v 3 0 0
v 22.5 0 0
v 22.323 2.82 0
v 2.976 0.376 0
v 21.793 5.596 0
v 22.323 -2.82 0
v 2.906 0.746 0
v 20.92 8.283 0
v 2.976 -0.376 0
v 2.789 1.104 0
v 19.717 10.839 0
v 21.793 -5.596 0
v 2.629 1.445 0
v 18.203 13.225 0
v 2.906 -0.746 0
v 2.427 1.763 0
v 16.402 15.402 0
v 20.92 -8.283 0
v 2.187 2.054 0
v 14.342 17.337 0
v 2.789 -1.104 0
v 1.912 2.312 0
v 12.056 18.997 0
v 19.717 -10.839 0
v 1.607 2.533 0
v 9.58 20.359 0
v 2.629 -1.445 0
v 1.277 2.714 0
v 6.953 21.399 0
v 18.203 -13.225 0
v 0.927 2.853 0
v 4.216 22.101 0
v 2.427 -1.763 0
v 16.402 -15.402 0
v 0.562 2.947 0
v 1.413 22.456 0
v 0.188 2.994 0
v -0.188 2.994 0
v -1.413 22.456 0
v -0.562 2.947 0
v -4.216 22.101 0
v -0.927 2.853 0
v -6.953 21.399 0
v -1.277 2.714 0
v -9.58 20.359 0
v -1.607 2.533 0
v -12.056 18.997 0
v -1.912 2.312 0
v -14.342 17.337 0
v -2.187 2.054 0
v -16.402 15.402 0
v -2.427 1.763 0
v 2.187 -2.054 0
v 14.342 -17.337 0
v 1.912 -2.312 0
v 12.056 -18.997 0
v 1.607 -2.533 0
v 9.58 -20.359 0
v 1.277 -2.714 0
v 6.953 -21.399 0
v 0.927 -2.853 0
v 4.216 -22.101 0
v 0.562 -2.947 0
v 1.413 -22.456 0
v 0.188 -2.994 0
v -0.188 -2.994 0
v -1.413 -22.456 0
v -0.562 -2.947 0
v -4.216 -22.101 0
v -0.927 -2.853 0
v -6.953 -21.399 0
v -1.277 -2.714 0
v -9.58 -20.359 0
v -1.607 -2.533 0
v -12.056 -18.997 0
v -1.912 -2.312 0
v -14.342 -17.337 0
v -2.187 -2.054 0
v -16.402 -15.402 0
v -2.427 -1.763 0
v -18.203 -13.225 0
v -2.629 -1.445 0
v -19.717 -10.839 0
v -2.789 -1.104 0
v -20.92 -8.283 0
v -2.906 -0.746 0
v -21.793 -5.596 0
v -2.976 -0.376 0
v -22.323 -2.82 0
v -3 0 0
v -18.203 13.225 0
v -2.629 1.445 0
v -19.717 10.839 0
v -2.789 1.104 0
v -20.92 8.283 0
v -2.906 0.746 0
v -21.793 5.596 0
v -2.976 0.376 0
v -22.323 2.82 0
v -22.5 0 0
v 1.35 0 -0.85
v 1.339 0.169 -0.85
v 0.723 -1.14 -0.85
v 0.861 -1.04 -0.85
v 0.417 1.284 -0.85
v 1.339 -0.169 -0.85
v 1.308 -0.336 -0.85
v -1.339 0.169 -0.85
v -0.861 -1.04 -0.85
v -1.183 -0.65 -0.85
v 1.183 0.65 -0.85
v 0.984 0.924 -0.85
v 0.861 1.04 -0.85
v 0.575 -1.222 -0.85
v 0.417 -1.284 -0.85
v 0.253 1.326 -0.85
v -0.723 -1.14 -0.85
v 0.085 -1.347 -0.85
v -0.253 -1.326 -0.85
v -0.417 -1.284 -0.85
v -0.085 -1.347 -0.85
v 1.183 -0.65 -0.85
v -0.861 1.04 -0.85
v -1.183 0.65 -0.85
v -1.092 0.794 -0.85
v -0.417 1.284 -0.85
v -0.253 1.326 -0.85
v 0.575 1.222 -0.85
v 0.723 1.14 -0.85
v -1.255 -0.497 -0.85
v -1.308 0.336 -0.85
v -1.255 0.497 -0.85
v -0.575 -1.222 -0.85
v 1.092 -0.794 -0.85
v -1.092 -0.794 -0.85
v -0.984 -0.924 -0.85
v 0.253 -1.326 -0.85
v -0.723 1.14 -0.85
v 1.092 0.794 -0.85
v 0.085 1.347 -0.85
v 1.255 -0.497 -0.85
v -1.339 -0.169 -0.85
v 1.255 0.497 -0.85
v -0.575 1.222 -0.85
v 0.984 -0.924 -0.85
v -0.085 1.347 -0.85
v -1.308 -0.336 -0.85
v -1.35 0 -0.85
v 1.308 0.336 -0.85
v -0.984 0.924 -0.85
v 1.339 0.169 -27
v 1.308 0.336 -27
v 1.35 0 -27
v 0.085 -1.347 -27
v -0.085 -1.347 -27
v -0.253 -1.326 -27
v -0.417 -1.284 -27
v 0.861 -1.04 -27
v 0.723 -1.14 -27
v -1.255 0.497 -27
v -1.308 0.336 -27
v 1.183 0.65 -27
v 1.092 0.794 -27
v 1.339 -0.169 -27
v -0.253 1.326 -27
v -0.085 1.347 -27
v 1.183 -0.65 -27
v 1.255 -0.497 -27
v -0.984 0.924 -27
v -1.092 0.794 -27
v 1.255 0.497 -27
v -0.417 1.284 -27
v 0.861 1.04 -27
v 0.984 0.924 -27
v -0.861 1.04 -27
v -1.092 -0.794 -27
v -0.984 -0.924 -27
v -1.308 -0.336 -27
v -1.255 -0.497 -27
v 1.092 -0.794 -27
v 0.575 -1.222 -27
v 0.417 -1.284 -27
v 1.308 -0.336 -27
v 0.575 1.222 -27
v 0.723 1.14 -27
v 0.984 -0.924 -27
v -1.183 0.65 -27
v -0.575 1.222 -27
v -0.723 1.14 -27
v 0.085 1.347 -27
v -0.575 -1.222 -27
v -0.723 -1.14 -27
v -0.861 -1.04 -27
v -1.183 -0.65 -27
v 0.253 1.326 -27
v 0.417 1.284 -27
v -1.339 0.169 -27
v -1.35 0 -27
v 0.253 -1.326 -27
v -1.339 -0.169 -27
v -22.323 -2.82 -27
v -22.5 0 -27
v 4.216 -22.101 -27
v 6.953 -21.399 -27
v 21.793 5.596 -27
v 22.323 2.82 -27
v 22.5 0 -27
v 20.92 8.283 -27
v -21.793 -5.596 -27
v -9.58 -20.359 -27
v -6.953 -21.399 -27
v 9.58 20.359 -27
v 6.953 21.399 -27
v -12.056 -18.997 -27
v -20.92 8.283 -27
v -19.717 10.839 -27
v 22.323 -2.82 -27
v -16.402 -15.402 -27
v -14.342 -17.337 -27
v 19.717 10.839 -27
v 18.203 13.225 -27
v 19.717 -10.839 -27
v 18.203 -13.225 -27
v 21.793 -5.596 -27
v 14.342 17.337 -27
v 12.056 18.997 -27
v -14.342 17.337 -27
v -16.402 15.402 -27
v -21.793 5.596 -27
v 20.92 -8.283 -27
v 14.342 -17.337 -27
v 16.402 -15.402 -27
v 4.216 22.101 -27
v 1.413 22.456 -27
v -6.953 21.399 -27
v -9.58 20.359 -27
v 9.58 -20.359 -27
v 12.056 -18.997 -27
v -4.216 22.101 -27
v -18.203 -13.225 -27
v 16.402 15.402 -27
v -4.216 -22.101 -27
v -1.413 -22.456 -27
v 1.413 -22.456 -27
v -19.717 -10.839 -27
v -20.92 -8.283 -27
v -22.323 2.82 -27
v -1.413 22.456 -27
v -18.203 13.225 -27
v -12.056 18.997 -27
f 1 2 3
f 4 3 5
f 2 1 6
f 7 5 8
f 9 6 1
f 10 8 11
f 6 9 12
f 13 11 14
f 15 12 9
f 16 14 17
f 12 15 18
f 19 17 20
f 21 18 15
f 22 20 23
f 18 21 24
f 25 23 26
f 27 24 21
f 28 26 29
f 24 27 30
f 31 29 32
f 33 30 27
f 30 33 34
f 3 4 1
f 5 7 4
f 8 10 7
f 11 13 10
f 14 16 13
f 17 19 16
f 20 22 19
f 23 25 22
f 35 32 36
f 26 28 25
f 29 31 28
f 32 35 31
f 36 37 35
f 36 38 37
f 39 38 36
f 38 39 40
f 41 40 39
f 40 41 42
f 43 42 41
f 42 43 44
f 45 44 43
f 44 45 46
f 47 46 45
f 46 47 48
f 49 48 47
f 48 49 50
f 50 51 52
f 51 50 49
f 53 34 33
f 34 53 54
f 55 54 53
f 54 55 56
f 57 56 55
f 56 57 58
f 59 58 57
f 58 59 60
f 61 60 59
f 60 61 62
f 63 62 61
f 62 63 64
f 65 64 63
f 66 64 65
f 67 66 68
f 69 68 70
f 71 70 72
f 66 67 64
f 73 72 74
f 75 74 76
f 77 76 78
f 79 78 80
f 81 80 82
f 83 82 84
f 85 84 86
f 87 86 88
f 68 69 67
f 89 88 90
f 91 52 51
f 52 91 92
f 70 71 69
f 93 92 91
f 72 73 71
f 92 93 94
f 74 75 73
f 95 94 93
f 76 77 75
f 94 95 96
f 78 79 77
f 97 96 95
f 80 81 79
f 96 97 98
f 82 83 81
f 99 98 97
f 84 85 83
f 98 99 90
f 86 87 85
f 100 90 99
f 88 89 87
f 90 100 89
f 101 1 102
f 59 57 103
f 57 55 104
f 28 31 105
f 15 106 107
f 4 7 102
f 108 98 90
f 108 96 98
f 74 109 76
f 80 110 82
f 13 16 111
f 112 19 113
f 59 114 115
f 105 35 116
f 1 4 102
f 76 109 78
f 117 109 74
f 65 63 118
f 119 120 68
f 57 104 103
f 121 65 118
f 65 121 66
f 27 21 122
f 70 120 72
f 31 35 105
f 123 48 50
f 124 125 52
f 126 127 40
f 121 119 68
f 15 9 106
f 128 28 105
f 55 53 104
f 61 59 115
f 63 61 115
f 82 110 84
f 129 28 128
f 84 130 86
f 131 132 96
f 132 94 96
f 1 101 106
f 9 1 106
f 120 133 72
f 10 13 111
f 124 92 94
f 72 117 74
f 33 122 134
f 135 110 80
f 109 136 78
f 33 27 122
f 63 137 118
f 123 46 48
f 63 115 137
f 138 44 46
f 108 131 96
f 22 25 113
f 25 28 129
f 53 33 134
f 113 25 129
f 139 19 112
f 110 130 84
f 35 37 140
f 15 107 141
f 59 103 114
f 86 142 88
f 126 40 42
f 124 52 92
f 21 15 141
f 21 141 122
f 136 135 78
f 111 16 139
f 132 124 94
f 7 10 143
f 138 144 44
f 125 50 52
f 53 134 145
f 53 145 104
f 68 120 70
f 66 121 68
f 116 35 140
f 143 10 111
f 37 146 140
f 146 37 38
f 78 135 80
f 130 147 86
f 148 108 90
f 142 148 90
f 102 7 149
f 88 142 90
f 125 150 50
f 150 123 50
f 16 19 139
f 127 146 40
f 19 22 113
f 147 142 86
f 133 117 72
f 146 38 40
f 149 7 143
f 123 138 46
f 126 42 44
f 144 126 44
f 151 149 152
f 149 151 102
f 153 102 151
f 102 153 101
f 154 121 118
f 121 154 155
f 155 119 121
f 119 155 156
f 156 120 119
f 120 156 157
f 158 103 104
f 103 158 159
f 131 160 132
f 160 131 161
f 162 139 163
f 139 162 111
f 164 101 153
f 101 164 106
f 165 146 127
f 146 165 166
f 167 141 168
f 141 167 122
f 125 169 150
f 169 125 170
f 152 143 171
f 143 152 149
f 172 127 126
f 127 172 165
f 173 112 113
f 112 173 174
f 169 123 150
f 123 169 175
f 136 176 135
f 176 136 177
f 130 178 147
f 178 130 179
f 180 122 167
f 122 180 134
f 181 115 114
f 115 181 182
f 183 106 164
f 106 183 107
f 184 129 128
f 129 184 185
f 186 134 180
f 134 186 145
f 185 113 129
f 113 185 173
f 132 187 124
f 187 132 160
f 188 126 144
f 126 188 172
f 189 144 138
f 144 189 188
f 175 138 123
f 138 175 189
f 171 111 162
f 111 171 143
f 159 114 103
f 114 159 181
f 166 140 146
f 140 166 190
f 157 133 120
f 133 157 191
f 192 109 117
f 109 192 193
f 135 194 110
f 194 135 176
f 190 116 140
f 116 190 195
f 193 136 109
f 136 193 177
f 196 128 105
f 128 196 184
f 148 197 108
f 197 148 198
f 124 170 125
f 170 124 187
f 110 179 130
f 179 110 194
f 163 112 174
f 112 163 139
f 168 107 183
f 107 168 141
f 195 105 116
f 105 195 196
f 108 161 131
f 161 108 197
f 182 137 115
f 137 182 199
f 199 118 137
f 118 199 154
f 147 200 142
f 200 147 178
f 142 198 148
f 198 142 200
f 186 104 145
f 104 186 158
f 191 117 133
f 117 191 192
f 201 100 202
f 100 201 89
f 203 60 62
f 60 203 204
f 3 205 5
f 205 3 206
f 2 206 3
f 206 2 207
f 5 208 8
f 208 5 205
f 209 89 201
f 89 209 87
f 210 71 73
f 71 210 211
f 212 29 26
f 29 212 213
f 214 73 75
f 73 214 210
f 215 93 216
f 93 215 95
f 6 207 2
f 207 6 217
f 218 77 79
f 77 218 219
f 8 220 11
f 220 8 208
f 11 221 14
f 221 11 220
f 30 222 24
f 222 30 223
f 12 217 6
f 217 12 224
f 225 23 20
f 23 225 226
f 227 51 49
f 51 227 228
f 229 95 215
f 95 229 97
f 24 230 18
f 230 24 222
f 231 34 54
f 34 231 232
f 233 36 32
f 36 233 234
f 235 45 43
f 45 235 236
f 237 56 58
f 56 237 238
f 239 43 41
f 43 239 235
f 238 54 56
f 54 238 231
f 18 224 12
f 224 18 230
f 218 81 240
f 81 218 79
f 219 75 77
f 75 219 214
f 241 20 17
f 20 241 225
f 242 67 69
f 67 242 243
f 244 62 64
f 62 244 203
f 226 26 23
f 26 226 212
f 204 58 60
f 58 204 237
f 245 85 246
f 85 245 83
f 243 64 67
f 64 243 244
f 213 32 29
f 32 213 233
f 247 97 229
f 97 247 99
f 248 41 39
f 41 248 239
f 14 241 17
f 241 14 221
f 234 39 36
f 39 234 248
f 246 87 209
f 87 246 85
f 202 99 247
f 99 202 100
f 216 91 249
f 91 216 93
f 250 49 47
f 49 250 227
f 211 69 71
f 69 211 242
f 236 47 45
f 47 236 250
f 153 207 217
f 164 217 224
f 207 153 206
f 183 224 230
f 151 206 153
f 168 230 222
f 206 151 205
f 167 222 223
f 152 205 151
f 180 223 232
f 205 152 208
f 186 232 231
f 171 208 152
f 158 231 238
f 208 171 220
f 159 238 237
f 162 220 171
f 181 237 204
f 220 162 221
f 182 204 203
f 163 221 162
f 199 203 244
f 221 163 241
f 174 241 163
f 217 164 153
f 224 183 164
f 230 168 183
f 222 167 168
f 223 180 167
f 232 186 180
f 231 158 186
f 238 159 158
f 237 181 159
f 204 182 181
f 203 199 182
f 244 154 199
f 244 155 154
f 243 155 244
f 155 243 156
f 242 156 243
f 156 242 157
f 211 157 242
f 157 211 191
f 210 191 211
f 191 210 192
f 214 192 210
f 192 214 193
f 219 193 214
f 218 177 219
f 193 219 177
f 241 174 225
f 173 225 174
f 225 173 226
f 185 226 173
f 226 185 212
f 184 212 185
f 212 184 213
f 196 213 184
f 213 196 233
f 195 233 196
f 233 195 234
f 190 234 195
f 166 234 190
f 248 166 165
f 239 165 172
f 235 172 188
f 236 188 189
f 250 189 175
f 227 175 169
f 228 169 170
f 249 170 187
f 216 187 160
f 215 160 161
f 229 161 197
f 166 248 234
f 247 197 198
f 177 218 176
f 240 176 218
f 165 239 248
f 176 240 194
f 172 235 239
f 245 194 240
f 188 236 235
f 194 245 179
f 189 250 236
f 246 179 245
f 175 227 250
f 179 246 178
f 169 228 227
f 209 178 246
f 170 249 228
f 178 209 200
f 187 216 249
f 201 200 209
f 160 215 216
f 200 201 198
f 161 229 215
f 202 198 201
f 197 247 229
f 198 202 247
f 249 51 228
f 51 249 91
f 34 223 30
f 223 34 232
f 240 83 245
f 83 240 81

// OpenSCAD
$fn = 50;


difference() {
	union() {
		translate(v = [0, 0, -27.0000000000]) {
			cylinder(h = 27, r = 22.5000000000);
		}
	}
	union() {
		translate(v = [0, 0, 0]) {
			rotate(a = [0, 0, 0]) {
				difference() {
					union() {
						translate(v = [0, 0, -30.0000000000]) {
							cylinder(h = 30, r = 1.0000000000);
						}
						translate(v = [0, 0, -0.8500000000]) {
							cylinder(h = 0.8500000000, r1 = 1.3500000000, r2 = 3.0000000000);
						}
						translate(v = [0, 0, -30.0000000000]) {
							cylinder(h = 30, r = 1.3500000000);
						}
						translate(v = [0, 0, -30.0000000000]) {
							cylinder(h = 30, r = 1.0000000000);
						}
					}
					union();
				}
			}
		}
	}
}
